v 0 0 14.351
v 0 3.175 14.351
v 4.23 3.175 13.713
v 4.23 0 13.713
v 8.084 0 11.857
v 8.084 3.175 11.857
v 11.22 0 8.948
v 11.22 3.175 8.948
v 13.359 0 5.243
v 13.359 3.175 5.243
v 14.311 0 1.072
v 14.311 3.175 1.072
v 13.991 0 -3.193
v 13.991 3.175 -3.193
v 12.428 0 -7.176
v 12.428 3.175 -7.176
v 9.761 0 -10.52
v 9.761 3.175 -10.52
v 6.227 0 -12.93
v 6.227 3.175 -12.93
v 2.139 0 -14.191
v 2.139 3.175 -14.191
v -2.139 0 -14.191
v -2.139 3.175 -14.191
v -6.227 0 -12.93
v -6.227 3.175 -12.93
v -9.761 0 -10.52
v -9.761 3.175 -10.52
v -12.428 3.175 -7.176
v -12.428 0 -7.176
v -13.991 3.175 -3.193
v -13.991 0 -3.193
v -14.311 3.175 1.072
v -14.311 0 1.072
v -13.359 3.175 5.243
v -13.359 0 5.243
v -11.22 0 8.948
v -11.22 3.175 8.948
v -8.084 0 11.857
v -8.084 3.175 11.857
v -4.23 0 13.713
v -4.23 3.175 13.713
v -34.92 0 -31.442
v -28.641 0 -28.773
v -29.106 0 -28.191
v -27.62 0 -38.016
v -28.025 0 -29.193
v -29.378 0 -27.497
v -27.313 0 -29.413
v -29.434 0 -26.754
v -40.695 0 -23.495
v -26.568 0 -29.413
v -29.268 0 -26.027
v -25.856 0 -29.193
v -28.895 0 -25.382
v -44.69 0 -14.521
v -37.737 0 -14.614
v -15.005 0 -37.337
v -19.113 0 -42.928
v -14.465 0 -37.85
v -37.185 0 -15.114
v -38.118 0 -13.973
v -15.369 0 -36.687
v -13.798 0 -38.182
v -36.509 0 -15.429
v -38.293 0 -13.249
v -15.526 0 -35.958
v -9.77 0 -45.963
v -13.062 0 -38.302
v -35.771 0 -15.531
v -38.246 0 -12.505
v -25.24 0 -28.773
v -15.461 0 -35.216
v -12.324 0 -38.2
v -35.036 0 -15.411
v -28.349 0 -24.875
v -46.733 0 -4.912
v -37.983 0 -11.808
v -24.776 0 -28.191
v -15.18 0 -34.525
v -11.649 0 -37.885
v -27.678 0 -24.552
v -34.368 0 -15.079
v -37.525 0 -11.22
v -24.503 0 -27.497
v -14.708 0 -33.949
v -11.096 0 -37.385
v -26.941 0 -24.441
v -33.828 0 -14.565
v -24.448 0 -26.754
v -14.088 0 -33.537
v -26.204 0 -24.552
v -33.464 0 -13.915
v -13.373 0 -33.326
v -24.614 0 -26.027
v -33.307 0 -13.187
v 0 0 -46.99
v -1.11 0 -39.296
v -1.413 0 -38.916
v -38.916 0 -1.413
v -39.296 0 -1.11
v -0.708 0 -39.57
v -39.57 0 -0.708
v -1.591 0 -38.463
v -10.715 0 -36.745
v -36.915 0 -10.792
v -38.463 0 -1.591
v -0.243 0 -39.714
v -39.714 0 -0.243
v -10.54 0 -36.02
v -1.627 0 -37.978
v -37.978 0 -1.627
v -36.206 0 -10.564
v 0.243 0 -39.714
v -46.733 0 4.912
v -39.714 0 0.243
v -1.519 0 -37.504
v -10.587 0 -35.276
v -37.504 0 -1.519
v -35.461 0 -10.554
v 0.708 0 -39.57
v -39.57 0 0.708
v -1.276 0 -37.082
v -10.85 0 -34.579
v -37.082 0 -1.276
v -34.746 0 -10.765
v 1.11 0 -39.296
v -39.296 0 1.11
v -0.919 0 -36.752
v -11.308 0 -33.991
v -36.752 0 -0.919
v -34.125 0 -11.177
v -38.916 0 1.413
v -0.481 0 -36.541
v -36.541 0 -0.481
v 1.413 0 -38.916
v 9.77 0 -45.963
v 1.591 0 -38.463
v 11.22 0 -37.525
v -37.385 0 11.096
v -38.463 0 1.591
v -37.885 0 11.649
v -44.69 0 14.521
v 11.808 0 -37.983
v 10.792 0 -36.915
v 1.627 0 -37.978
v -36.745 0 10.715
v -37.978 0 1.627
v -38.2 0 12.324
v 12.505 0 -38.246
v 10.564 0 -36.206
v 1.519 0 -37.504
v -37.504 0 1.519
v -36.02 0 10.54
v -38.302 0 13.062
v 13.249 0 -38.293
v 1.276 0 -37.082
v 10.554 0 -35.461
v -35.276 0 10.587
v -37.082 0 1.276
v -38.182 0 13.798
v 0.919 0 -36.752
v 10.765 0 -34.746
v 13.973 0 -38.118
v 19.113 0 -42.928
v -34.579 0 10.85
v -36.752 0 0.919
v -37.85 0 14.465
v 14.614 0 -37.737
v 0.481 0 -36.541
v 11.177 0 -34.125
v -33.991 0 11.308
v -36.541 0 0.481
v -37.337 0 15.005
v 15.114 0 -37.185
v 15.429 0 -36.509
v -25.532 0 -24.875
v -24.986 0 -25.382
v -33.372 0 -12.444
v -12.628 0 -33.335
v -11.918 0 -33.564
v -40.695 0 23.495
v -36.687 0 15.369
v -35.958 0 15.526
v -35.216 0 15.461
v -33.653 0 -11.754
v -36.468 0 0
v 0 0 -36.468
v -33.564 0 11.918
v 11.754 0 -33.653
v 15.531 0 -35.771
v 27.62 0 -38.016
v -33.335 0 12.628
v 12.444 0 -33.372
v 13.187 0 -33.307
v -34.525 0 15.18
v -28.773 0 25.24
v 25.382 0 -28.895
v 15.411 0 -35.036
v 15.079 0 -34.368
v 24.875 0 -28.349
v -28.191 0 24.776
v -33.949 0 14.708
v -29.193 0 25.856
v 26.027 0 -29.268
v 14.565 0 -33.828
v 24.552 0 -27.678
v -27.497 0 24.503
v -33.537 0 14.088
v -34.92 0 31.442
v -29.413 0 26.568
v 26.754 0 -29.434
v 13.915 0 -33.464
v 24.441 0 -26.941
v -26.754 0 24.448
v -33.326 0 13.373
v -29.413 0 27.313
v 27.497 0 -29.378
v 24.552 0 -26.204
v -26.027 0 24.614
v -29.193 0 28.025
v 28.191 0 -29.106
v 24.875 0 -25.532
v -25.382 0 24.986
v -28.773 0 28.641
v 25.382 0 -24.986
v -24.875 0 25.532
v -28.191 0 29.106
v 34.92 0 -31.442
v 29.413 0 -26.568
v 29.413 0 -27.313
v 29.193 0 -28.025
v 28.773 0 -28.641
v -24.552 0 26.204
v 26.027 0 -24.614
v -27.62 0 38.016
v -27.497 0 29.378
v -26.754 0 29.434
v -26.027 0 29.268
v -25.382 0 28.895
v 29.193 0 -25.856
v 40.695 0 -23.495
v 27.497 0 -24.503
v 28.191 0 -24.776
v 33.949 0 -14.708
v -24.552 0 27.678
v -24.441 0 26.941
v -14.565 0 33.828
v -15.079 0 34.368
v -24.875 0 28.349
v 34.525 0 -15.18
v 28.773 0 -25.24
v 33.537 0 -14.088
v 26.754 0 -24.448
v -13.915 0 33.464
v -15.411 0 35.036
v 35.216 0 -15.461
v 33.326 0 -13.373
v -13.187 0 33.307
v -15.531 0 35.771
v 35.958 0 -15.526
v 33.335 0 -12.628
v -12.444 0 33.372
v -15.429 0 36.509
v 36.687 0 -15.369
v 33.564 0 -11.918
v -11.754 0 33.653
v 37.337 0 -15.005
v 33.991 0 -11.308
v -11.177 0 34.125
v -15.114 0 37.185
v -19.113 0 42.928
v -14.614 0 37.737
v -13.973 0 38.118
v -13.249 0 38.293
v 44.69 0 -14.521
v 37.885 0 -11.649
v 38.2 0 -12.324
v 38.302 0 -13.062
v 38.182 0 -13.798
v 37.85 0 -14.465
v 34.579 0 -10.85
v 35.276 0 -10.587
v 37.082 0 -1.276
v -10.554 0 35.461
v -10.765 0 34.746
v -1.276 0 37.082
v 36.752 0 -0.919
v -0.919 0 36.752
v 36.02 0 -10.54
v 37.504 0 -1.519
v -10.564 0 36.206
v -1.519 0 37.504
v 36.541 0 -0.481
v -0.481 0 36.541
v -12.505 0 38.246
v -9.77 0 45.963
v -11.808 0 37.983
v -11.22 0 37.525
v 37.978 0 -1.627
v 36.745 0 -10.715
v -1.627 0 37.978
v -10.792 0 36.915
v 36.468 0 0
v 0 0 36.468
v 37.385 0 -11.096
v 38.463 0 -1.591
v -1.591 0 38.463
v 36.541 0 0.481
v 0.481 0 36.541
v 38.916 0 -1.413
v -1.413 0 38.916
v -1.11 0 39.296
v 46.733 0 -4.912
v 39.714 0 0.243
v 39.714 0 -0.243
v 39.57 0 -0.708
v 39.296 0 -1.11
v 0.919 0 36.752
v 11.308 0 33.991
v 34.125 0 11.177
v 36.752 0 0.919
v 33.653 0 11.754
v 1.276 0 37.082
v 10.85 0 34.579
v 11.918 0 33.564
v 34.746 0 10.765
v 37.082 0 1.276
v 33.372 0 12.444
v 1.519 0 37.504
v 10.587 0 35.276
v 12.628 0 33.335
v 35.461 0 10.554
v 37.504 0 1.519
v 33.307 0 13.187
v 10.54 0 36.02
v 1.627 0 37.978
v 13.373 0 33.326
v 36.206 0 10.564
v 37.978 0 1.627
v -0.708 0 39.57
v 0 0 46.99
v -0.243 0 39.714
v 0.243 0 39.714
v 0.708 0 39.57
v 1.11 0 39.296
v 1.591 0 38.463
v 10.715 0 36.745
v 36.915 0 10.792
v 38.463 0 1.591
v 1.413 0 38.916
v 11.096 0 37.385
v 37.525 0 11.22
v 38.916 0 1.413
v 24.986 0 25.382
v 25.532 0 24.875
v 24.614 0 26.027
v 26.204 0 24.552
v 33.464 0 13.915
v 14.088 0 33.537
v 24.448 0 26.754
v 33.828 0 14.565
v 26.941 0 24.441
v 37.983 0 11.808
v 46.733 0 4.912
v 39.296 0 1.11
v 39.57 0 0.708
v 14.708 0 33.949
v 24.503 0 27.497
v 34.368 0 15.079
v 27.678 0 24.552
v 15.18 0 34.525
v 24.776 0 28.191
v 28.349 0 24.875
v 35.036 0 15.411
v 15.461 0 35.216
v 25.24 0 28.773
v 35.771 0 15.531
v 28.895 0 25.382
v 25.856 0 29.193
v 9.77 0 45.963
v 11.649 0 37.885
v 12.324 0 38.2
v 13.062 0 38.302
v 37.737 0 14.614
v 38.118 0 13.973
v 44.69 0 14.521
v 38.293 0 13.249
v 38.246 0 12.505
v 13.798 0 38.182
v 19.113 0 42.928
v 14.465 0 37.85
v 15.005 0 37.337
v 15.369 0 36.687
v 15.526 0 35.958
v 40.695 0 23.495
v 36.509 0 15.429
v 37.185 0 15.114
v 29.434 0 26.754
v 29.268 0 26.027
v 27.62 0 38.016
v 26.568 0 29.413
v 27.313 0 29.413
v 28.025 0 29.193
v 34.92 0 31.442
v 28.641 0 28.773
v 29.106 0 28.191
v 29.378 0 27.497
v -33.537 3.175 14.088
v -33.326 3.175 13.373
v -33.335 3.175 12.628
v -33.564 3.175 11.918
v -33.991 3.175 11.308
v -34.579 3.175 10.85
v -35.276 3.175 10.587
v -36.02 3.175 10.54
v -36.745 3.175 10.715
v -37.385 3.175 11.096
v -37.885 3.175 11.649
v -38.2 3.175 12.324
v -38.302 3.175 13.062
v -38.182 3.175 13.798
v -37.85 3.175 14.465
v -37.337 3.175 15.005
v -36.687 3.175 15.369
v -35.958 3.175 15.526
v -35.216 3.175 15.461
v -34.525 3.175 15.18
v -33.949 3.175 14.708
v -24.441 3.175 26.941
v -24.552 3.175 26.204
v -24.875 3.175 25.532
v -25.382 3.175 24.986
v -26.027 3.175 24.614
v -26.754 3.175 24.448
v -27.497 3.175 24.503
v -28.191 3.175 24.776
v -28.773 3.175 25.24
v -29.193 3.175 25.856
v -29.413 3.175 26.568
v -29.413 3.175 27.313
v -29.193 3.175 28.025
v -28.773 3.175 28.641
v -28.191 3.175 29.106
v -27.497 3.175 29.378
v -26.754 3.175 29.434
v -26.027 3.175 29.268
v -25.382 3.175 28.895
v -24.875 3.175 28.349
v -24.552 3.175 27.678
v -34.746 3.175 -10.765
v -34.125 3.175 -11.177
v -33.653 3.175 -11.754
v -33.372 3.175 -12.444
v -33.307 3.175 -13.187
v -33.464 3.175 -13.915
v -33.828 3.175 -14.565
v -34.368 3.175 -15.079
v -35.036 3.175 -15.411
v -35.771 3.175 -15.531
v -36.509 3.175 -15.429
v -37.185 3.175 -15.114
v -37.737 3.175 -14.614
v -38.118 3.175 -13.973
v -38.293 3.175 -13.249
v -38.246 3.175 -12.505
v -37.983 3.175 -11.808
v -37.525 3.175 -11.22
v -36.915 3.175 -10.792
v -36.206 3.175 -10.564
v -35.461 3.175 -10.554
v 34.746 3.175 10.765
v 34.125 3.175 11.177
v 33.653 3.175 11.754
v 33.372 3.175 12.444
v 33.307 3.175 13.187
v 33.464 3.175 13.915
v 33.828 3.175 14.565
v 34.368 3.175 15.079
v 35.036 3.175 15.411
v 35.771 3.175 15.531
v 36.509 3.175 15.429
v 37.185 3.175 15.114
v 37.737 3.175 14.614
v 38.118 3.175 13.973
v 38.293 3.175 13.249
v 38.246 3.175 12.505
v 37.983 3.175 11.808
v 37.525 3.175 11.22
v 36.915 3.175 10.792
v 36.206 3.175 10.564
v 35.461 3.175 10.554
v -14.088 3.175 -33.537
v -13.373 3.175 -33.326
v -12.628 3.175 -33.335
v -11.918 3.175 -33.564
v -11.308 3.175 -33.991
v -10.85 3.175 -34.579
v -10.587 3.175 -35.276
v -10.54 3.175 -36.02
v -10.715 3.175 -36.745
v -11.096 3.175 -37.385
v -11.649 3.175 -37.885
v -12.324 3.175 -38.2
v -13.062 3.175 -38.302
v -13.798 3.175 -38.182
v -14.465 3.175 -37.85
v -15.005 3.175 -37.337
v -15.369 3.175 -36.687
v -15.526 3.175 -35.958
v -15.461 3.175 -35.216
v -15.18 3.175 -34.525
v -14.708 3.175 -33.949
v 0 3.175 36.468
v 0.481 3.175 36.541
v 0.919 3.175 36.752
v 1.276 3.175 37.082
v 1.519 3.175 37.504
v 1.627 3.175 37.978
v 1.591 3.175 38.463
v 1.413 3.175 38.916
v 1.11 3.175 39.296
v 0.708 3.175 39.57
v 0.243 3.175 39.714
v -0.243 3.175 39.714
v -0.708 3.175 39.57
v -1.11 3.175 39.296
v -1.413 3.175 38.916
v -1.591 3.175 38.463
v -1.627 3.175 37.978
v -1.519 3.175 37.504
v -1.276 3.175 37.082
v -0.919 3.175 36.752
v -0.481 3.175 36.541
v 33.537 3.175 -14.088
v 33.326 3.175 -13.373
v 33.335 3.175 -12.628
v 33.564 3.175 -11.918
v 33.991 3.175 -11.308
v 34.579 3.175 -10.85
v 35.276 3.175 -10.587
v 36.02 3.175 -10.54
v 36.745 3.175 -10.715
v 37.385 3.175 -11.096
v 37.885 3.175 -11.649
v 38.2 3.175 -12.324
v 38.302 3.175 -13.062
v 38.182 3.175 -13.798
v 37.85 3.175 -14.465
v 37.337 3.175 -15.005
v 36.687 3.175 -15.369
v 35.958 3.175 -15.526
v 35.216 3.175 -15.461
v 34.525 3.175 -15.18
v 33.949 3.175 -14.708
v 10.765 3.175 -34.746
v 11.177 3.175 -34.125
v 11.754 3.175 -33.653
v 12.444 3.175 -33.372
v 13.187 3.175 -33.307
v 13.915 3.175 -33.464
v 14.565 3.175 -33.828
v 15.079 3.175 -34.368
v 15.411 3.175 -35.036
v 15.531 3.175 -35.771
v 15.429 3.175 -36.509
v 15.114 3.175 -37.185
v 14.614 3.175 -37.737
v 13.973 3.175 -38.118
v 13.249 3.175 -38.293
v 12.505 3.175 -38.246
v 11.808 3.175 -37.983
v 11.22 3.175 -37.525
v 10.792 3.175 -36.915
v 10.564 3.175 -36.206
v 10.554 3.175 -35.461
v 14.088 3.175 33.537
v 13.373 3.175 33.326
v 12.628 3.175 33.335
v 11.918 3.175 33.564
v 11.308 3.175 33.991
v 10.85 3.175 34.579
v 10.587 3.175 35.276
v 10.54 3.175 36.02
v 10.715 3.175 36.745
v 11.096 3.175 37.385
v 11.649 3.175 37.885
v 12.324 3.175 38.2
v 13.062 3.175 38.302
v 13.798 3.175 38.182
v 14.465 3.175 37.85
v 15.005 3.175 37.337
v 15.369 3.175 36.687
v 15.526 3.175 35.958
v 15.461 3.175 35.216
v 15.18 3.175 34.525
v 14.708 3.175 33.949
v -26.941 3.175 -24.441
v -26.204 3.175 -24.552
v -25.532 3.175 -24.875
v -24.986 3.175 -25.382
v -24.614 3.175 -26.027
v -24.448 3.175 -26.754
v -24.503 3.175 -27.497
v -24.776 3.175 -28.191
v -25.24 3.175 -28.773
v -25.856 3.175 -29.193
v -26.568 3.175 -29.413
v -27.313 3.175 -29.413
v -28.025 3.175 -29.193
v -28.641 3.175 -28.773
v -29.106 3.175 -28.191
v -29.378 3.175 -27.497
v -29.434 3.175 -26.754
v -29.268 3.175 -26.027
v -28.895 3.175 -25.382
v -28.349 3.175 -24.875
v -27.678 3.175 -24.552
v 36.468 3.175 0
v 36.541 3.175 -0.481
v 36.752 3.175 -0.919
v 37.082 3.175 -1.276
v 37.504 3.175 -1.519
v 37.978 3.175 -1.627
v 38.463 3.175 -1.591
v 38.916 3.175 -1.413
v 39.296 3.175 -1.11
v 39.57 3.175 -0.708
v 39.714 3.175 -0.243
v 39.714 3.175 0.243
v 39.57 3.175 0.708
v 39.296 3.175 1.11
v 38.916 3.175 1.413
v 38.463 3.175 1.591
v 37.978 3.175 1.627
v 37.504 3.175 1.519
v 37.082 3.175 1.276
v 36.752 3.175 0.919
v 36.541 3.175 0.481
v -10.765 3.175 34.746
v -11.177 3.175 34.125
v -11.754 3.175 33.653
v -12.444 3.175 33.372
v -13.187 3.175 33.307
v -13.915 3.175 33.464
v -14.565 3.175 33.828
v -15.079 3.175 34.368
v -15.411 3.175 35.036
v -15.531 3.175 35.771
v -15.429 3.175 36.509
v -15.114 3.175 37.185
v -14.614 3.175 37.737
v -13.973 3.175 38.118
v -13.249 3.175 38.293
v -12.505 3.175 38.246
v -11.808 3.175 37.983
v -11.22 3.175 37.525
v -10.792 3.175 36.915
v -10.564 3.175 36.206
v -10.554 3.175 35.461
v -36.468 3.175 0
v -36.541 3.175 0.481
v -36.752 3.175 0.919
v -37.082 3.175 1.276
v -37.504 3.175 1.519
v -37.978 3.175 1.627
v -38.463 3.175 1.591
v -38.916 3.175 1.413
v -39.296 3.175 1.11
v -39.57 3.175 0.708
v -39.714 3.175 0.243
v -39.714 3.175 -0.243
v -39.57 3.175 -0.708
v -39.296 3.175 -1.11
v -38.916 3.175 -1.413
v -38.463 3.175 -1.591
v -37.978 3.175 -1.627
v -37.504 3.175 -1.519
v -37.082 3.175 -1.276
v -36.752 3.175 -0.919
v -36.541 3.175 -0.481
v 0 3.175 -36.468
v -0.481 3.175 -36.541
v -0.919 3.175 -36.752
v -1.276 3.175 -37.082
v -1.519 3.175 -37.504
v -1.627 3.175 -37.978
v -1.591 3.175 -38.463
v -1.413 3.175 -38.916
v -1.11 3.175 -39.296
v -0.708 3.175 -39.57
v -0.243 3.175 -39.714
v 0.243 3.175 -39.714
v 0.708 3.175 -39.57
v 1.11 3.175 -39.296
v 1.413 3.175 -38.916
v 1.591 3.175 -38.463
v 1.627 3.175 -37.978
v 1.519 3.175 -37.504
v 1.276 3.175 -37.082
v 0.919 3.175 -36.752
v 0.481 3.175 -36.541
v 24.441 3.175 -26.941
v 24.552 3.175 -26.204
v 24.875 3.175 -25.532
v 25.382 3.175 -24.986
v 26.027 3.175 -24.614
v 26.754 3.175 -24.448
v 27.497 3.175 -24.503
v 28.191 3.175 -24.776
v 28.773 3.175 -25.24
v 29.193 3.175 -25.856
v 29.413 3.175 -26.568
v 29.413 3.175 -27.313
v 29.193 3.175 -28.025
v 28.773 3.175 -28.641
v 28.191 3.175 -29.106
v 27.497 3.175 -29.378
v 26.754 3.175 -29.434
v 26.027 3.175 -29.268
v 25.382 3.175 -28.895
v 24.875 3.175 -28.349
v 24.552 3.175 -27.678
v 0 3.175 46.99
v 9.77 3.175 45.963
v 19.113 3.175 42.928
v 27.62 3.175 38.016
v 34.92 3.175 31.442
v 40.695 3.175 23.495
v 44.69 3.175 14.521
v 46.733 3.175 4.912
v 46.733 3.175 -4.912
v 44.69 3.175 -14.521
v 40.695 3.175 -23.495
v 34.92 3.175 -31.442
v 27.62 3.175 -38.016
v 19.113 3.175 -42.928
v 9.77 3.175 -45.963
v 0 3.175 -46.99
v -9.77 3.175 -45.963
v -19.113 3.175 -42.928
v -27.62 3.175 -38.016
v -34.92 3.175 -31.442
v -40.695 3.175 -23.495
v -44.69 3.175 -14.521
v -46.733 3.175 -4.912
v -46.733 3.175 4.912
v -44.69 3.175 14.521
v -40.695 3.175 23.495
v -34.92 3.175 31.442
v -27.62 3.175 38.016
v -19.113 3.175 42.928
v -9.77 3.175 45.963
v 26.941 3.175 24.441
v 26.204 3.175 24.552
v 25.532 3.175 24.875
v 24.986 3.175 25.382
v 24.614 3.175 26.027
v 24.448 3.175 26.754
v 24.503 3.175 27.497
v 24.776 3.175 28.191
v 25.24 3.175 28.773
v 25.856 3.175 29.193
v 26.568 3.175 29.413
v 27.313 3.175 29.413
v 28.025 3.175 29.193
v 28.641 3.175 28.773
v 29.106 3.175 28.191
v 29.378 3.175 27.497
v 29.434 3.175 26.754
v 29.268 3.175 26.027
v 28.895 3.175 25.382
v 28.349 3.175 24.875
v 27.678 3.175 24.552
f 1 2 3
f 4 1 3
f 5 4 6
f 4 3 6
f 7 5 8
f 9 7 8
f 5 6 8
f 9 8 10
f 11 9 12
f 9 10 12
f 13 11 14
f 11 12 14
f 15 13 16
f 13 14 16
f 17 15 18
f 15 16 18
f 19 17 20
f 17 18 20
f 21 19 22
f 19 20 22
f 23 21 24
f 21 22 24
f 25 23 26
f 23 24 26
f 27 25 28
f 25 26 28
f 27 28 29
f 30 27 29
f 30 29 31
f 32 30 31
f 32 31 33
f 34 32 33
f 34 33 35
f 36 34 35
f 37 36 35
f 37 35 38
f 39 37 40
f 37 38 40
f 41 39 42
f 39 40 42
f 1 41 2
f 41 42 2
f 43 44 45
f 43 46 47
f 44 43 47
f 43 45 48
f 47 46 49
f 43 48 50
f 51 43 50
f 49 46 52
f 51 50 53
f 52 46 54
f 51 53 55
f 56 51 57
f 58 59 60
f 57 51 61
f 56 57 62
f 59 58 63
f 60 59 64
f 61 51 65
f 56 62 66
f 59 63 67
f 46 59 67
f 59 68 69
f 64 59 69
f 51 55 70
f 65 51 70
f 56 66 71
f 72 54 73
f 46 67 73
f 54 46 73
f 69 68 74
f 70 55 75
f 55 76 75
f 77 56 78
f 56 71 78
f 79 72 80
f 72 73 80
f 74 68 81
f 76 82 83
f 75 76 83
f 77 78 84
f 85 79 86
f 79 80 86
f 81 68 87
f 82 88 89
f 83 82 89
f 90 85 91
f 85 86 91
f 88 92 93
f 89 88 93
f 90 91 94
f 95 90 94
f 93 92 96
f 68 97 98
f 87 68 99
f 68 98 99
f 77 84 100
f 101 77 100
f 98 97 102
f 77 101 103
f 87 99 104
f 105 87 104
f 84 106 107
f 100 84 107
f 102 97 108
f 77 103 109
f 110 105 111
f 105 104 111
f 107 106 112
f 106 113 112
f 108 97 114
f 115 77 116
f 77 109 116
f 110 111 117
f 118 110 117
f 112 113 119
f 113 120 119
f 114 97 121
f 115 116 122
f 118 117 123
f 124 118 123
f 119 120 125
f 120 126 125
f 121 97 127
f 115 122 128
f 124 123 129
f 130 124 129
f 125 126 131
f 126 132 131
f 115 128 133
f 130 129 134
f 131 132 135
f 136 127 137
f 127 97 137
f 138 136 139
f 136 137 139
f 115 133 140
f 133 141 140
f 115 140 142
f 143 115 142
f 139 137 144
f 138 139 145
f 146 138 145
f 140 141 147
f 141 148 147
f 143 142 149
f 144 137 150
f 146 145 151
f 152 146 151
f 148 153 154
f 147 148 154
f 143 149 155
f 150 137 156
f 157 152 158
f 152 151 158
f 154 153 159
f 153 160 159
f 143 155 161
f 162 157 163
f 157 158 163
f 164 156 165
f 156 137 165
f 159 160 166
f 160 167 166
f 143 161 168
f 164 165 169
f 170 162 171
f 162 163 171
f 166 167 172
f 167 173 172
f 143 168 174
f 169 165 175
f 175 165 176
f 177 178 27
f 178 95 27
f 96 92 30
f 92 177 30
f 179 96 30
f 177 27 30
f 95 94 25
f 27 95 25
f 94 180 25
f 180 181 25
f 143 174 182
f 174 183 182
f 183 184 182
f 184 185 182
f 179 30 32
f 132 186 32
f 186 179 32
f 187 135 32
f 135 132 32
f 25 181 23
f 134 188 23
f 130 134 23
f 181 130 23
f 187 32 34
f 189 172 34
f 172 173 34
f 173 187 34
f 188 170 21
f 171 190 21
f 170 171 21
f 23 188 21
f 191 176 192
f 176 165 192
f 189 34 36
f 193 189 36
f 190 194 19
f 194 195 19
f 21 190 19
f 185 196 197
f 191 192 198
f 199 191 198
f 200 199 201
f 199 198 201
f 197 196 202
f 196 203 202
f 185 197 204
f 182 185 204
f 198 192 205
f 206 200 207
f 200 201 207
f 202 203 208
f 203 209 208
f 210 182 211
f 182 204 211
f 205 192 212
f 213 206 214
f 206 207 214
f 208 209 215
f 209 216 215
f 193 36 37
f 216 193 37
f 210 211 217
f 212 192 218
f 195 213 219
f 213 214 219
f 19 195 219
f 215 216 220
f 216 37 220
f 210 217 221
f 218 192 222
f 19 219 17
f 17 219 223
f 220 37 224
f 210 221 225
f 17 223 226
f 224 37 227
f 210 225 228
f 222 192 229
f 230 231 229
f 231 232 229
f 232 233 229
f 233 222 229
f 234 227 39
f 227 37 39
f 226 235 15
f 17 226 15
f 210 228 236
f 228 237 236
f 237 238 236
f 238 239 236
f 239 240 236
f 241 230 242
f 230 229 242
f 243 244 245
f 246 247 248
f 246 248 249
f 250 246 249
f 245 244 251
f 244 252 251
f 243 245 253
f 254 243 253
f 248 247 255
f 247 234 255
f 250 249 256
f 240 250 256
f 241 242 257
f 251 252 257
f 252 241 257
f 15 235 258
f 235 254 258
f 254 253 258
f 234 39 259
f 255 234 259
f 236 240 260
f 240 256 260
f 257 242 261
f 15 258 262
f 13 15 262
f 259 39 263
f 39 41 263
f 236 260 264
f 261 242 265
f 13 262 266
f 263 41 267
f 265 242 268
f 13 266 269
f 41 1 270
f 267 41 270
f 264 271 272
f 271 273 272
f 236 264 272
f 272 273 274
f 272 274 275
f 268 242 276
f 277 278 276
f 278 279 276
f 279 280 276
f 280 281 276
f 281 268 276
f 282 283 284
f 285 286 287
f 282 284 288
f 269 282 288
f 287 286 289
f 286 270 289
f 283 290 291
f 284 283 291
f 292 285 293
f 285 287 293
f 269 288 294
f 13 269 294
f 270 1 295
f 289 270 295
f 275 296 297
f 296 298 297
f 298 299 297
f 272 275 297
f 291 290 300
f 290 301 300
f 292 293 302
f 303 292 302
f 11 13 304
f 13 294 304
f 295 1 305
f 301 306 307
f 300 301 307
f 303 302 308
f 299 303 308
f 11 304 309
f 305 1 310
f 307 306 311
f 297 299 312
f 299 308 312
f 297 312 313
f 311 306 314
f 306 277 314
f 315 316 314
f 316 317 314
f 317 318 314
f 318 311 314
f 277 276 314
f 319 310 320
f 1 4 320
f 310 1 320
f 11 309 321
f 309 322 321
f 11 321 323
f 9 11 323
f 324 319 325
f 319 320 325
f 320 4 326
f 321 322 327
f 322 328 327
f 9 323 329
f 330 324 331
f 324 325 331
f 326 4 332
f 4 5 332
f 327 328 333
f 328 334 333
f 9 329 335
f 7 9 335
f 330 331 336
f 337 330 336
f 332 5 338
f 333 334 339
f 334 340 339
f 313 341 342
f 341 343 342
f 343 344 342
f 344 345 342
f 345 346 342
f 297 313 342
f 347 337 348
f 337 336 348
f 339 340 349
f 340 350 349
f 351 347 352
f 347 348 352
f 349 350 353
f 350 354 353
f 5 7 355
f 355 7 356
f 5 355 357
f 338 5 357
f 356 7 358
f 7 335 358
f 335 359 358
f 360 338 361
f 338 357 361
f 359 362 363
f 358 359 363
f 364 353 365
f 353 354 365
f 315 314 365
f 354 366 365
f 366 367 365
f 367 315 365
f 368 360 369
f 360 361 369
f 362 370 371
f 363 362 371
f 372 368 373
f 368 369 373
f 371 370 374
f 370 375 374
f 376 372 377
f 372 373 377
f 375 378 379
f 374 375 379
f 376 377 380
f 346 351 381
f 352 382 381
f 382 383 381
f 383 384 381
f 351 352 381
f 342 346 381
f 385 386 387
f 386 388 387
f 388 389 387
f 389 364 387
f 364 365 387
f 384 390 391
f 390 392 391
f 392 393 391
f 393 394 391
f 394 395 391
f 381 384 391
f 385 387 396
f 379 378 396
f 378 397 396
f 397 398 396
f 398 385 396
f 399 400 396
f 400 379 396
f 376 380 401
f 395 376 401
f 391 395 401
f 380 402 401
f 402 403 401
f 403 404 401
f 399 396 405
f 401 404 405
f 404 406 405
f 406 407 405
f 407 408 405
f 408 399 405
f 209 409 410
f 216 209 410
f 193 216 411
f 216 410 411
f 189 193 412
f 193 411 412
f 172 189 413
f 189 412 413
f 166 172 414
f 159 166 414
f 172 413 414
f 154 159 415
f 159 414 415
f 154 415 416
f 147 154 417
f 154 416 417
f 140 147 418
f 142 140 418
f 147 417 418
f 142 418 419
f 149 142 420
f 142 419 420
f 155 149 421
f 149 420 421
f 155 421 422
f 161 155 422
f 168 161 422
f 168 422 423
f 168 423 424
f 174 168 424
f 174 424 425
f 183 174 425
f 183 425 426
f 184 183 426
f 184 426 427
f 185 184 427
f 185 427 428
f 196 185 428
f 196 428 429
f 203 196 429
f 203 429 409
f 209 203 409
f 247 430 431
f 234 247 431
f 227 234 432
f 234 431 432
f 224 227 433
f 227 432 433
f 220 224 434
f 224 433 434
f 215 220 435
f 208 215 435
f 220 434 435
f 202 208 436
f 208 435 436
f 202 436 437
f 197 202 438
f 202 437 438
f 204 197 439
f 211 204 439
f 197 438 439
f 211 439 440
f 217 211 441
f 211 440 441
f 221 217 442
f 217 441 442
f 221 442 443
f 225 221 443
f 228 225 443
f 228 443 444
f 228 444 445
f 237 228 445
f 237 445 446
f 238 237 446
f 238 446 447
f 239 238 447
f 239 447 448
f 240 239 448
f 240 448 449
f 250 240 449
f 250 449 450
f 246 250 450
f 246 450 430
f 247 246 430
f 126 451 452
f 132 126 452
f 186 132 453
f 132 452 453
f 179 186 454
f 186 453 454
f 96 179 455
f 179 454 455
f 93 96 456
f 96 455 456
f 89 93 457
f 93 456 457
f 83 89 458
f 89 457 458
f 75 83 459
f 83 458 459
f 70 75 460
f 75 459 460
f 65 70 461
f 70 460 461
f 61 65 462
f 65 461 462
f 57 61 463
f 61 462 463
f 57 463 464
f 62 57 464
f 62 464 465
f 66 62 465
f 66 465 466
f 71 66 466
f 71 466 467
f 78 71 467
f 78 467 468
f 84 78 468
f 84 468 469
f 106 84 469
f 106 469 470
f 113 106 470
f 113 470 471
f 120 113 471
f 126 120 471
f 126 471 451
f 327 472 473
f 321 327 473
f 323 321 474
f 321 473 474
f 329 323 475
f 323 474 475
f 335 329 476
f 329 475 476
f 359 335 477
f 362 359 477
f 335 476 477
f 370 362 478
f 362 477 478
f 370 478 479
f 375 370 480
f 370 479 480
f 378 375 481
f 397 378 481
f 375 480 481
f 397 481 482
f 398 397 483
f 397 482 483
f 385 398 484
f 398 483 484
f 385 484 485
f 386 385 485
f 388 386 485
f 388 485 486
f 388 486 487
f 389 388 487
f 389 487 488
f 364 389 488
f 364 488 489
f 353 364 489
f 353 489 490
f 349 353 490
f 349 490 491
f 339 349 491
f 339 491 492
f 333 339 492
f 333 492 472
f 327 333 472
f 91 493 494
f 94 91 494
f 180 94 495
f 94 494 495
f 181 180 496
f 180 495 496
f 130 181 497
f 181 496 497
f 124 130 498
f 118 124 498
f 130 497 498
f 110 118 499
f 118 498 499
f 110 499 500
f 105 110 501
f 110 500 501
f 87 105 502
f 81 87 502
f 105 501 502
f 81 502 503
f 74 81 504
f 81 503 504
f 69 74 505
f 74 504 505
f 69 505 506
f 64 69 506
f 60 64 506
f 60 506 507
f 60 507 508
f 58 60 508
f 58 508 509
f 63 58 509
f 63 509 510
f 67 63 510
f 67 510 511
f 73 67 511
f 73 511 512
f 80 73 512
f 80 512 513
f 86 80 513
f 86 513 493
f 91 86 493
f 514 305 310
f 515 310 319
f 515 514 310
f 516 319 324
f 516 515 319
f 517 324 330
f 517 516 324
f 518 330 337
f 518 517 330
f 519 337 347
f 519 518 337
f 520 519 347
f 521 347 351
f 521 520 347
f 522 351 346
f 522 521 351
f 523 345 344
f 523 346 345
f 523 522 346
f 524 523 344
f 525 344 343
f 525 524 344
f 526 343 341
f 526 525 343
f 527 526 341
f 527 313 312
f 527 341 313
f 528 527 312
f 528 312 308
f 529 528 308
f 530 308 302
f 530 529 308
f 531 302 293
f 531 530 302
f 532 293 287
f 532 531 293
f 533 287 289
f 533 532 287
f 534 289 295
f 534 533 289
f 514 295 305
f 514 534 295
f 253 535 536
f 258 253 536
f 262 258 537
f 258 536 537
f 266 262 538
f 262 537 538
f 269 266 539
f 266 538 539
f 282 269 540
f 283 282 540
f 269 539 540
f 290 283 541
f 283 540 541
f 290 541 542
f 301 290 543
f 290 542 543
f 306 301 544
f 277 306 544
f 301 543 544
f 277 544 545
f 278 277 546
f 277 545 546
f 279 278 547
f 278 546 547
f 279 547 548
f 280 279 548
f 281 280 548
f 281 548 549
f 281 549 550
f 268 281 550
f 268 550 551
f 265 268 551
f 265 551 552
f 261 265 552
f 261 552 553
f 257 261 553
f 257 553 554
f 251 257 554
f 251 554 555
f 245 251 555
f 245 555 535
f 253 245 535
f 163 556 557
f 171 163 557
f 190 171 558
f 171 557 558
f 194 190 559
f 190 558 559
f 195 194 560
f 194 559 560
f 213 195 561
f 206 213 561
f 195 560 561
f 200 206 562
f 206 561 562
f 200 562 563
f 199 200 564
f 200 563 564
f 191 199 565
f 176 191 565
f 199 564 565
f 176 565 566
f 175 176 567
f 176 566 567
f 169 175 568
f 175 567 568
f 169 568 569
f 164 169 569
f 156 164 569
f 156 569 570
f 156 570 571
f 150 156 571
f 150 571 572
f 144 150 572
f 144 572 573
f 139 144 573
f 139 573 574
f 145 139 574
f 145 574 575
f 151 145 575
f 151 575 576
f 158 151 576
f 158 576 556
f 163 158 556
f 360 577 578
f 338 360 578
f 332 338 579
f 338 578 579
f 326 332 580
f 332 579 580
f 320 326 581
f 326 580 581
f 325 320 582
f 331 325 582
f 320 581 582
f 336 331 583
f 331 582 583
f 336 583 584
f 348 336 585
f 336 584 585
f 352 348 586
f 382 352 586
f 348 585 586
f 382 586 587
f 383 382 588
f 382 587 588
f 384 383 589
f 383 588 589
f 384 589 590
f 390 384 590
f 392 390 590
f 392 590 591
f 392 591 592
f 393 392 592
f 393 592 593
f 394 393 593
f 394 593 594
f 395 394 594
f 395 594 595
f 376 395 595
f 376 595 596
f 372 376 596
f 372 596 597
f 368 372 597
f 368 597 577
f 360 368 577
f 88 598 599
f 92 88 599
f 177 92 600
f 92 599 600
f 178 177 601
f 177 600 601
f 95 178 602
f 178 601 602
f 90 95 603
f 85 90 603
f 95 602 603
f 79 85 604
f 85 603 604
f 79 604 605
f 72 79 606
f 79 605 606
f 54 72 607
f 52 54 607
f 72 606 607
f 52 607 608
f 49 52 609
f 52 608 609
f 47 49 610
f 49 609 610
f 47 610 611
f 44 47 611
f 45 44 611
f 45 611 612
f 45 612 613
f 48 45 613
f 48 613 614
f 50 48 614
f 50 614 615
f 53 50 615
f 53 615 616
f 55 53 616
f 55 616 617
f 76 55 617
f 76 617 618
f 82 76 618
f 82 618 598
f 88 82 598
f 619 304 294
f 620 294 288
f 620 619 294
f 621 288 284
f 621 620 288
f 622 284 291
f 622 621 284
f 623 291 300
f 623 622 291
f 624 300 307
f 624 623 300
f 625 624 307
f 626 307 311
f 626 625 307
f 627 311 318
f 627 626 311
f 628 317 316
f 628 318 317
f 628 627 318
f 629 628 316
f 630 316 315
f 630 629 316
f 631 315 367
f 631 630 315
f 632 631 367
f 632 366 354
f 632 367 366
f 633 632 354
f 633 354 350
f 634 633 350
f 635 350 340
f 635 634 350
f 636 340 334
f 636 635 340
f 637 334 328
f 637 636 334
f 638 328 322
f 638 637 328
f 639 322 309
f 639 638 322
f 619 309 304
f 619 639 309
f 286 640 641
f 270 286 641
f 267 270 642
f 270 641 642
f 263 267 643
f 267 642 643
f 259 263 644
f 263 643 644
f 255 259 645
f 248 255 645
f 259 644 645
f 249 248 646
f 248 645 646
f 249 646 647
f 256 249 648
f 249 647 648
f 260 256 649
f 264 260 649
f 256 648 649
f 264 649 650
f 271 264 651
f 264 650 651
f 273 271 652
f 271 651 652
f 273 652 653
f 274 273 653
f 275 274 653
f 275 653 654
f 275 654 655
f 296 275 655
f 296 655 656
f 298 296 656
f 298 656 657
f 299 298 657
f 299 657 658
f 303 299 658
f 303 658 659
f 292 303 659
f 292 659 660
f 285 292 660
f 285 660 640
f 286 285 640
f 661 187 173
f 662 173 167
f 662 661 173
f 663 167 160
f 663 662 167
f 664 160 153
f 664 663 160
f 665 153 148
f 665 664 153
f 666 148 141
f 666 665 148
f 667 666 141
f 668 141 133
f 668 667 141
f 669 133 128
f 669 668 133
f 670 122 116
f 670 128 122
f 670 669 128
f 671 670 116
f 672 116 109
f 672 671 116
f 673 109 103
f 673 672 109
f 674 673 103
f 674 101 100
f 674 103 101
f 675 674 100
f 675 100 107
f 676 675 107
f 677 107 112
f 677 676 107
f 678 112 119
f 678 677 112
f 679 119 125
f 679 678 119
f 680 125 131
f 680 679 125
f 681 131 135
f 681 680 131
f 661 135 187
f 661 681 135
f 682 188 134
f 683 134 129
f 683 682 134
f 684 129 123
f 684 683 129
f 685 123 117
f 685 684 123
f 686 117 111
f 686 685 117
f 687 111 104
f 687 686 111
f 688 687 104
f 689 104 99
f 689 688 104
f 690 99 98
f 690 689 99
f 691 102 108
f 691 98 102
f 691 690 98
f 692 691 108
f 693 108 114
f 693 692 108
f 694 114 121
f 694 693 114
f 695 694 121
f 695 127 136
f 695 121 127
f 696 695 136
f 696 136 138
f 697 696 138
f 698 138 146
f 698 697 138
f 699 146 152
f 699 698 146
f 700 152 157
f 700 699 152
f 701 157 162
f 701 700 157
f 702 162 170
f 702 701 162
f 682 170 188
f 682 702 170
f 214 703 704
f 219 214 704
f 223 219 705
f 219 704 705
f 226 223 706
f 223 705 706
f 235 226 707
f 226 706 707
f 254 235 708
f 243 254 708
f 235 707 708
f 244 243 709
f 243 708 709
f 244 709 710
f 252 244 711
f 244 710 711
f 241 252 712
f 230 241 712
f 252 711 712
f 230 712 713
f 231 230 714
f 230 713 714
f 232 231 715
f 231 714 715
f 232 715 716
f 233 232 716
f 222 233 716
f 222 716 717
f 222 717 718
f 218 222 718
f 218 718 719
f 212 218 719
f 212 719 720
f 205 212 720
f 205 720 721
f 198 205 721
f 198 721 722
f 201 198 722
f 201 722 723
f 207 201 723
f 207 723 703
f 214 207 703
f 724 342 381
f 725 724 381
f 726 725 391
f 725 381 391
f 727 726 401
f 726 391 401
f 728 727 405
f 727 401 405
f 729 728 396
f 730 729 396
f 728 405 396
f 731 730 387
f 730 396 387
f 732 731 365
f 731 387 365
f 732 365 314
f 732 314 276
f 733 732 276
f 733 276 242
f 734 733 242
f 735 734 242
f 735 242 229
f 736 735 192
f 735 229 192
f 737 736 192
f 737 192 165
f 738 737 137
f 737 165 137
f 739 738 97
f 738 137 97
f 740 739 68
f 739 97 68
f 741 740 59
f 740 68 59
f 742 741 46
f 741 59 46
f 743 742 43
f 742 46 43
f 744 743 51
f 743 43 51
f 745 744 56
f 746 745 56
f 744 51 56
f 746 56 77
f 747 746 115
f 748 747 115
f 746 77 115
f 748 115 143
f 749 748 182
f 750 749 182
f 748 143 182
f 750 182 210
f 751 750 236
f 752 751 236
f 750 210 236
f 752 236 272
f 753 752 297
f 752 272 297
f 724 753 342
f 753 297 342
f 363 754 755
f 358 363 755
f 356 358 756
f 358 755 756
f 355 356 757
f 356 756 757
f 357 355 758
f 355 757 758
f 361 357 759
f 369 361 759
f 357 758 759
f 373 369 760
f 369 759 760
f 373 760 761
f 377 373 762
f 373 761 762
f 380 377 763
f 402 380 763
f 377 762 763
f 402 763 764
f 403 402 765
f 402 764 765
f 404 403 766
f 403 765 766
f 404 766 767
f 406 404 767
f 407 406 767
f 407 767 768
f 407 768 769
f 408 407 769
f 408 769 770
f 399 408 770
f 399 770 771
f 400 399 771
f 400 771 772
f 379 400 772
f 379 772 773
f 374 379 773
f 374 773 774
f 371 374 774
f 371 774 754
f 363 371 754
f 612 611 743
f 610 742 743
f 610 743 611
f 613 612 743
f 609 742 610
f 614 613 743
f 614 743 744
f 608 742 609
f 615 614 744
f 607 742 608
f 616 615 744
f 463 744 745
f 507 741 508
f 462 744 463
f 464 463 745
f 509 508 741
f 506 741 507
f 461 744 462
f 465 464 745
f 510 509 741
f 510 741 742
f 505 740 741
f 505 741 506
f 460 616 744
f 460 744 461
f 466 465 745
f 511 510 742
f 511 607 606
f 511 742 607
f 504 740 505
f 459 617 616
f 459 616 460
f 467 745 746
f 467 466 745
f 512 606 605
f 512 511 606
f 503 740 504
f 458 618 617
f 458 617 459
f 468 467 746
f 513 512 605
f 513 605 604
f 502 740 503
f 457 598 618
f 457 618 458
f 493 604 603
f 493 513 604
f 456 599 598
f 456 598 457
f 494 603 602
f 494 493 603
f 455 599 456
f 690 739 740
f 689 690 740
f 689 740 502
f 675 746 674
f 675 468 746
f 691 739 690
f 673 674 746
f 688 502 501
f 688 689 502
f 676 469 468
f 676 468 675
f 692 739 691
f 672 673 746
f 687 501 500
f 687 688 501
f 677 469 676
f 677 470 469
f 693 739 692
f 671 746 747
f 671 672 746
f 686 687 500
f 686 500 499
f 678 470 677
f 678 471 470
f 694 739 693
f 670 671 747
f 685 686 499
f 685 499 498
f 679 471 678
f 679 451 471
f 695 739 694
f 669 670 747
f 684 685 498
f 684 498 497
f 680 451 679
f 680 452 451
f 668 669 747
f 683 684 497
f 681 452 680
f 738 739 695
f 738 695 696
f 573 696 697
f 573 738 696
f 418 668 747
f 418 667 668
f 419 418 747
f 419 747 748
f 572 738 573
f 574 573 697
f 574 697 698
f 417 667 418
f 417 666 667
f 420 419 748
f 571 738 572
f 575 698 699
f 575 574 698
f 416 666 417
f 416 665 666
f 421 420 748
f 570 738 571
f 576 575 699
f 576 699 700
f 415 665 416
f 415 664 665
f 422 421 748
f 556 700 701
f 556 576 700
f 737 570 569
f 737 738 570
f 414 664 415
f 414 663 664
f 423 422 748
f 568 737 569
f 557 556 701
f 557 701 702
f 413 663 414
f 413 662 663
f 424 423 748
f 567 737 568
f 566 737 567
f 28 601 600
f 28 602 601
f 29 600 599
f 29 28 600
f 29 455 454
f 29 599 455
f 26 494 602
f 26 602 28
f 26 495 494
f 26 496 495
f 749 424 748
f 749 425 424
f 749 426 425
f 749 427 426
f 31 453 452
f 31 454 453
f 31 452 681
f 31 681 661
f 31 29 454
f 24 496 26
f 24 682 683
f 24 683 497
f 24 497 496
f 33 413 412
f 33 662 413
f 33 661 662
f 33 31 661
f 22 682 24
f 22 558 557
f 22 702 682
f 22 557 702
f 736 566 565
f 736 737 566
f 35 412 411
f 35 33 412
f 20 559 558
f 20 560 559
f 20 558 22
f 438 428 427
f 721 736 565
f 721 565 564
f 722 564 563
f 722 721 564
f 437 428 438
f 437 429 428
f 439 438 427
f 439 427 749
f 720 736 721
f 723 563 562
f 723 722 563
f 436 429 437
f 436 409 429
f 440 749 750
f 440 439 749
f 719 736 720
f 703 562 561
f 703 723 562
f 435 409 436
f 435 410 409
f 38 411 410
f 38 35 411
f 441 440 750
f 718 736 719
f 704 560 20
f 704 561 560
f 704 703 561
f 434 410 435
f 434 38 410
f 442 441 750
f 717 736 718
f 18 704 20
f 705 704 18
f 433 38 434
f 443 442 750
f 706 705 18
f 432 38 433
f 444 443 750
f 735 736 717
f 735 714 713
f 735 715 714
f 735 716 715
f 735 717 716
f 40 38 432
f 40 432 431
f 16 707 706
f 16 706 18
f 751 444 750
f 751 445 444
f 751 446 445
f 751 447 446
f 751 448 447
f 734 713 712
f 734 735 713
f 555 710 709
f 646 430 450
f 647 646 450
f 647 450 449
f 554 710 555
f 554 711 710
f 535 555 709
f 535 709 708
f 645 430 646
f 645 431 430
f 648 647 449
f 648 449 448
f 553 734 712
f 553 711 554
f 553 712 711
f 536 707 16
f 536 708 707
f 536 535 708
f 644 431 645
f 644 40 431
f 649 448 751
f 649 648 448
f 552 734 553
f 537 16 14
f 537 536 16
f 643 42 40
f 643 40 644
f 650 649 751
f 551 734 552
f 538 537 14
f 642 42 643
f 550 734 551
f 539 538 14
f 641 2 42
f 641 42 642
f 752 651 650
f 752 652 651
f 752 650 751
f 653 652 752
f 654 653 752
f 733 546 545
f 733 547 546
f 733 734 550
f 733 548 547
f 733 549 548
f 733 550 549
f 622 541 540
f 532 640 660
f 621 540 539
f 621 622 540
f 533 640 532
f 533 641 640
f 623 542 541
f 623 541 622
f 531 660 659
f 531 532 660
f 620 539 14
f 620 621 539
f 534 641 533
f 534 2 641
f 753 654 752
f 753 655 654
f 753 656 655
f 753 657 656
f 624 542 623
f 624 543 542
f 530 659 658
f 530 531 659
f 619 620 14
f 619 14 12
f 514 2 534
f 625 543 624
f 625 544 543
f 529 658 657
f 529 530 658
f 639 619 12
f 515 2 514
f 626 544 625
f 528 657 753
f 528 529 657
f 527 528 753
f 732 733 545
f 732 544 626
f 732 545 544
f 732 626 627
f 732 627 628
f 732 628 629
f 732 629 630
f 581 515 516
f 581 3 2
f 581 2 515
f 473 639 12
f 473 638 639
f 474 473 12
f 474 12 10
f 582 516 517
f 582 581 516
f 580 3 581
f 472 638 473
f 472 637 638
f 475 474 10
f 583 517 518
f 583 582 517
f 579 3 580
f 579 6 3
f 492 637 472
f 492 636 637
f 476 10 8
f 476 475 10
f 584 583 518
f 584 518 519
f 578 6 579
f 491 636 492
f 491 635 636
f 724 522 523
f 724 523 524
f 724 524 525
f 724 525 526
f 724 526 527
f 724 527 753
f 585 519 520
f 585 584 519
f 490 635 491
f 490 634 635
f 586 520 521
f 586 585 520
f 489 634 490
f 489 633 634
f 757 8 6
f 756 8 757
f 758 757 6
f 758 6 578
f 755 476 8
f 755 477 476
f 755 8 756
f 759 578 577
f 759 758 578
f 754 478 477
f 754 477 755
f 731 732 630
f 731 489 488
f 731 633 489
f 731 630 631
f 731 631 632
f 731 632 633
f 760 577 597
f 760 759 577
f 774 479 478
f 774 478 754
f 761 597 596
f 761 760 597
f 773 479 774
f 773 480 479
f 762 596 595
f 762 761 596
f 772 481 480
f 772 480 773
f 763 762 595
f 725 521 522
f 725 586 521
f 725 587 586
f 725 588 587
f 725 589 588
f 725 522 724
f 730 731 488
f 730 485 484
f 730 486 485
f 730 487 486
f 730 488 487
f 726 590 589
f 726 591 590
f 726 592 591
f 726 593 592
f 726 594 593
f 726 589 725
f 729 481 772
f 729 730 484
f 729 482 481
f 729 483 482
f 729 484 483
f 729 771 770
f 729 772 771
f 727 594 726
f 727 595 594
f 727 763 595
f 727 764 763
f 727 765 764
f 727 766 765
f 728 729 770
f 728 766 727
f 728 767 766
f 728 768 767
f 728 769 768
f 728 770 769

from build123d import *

# Parameters (mm, degrees)
SKETCH1_R                   = 46.99
BOSS_EXTRUDE1_DEPTH         = 3.175
SKETCH2_R                   = 14.351
CUT_EXTRUDE1_DEPTH          = 3.175
CIRPATTERN1_COUNT           = 4
SKETCH5_R                   = 2.5
CUT_EXTRUDE2_DEPTH          = 5.08
CIRPATTERN2_COUNT           = 4
CIRPATTERN3_COUNT           = 2
CIRPATTERN3_ANGLE           = 25
CIRPATTERN3_COPY_1_SKETCH_R = 2.5
CIRPATTERN3_COPY_1_DEPTH    = 5.08
CIRPATTERN3_COPY_2_SKETCH_R = 2.5
CIRPATTERN3_COPY_2_DEPTH    = 5.08
CIRPATTERN3_COPY_3_SKETCH_R = 2.5
CIRPATTERN3_COPY_3_DEPTH    = 5.08
CIRPATTERN4_COUNT           = 2
CIRPATTERN4_ANGLE           = 25
CIRPATTERN4_COPY_1_SKETCH_R = 2.5
CIRPATTERN4_COPY_1_DEPTH    = 5.08
CIRPATTERN4_COPY_2_SKETCH_R = 2.5
CIRPATTERN4_COPY_2_DEPTH    = 5.08
CIRPATTERN4_COPY_3_SKETCH_R = 2.5
CIRPATTERN4_COPY_3_DEPTH    = 5.08


with BuildPart() as part:
    # Sketch1 → Boss-Extrude1 (new body)
    with BuildSketch(Plane(origin=(0, 0, 0), x_dir=(1, 0, 0), z_dir=(0, 1, 0))):
        with Locations(Location((0, 0, 0), (0, 0, 270))):
            Circle(SKETCH1_R)
    extrude(amount=BOSS_EXTRUDE1_DEPTH)

    # Sketch2 → Cut-Extrude1 (cut)
    with BuildSketch(Plane(origin=(0, 3.175, 0), x_dir=(1, 0, 0), z_dir=(0, 1, 0))):
        with Locations(Location((0, 0, 0), (0, 0, 270))):
            Circle(SKETCH2_R)
    extrude(amount=-CUT_EXTRUDE1_DEPTH, mode=Mode.SUBTRACT)

    # Sketch3 → #4 Clearance Hole1 (revolve, cut)
    with BuildSketch(Plane(origin=(0, 3.175, -38.1), x_dir=(0, 0, 1), z_dir=(1, 0, 0))):
        Polygon((0, 0), (0, 11.140574487), (1.63195, 10.16), (1.63195, 0), align=None)
    f_4_clearance_hole1 = revolve(axis=Axis((0, 9.525, -38.1), (0, -1, 0)), mode=Mode.SUBTRACT)

    # CirPattern1: #4 Clearance Hole1 ×4 about axis
    cirpattern1_axis = Axis((0, 0, 0), (0, 1, 0))
    for i in range(1, CIRPATTERN1_COUNT):
        add(f_4_clearance_hole1.rotate(cirpattern1_axis, i * 360 / CIRPATTERN1_COUNT), mode=Mode.SUBTRACT)

    # Sketch5 → Cut-Extrude2 (cut)
    with BuildSketch(Plane(origin=(0, 3.175, 0), x_dir=(1, 0, 0), z_dir=(0, 1, 0))):
        with Locations(Location((-26.940768363, 26.940768363, 0), (0, 0, 270))):
            Circle(SKETCH5_R)
    cut_extrude2 = extrude(amount=-CUT_EXTRUDE2_DEPTH, mode=Mode.SUBTRACT)

    # CirPattern2: Cut-Extrude2 ×4 about axis
    cirpattern2_axis = Axis((0, 0, 0), (0, 1, 0))
    for i in range(1, CIRPATTERN2_COUNT):
        add(cut_extrude2.rotate(cirpattern2_axis, i * 360 / CIRPATTERN2_COUNT), mode=Mode.SUBTRACT)

    # CirPattern3: Cut-Extrude2 ×2 about axis
    cirpattern3_axis = Axis((0, 0, 0), (0, 1, 0))
    for i in range(1, CIRPATTERN3_COUNT):
        add(cut_extrude2.rotate(cirpattern3_axis, i * CIRPATTERN3_ANGLE / (CIRPATTERN3_COUNT - 1)), mode=Mode.SUBTRACT)

    # CirPattern3 copy 1 sketch → CirPattern3 copy 1 (cut)
    with BuildSketch(Plane(origin=(0, 3.175, 0), x_dir=(-0.4226182617407003, 0, -0.9063077870366495), z_dir=(0, 1, 0))):
        with Locations(Location((-26.940768363, 26.940768363, 0), (0, 0, 270))):
            Circle(CIRPATTERN3_COPY_1_SKETCH_R)
    extrude(amount=-CIRPATTERN3_COPY_1_DEPTH, mode=Mode.SUBTRACT)

    # CirPattern3 copy 2 sketch → CirPattern3 copy 2 (cut)
    with BuildSketch(Plane(origin=(0, 3.175, 0), x_dir=(-0.9063077870366495, 0, 0.4226182617407002), z_dir=(0, 1, 0))):
        with Locations(Location((-26.940768363, 26.940768363, 0), (0, 0, 270))):
            Circle(CIRPATTERN3_COPY_2_SKETCH_R)
    extrude(amount=-CIRPATTERN3_COPY_2_DEPTH, mode=Mode.SUBTRACT)

    # CirPattern3 copy 3 sketch → CirPattern3 copy 3 (cut)
    with BuildSketch(Plane(origin=(0, 3.175, 0), x_dir=(0.42261826174070016, 0, 0.9063077870366496), z_dir=(0, 1, 0))):
        with Locations(Location((-26.940768363, 26.940768363, 0), (0, 0, 270))):
            Circle(CIRPATTERN3_COPY_3_SKETCH_R)
    extrude(amount=-CIRPATTERN3_COPY_3_DEPTH, mode=Mode.SUBTRACT)

    # CirPattern4: Cut-Extrude2 ×2 about axis
    cirpattern4_axis = Axis((0, 0, 0), (0, -1, 0))
    for i in range(1, CIRPATTERN4_COUNT):
        add(cut_extrude2.rotate(cirpattern4_axis, i * CIRPATTERN4_ANGLE / (CIRPATTERN4_COUNT - 1)), mode=Mode.SUBTRACT)

    # CirPattern4 copy 1 sketch → CirPattern4 copy 1 (cut)
    with BuildSketch(Plane(origin=(0, 3.175, 0), x_dir=(0.4226182617407004, 0, -0.9063077870366495), z_dir=(0, 1, 0))):
        with Locations(Location((-26.940768363, 26.940768363, 0), (0, 0, 270))):
            Circle(CIRPATTERN4_COPY_1_SKETCH_R)
    extrude(amount=-CIRPATTERN4_COPY_1_DEPTH, mode=Mode.SUBTRACT)

    # CirPattern4 copy 2 sketch → CirPattern4 copy 2 (cut)
    with BuildSketch(Plane(origin=(0, 3.175, 0), x_dir=(-0.9063077870366495, 0, -0.42261826174070044), z_dir=(0, 1, 0))):
        with Locations(Location((-26.940768363, 26.940768363, 0), (0, 0, 270))):
            Circle(CIRPATTERN4_COPY_2_SKETCH_R)
    extrude(amount=-CIRPATTERN4_COPY_2_DEPTH, mode=Mode.SUBTRACT)

    # CirPattern4 copy 3 sketch → CirPattern4 copy 3 (cut)
    with BuildSketch(Plane(origin=(0, 3.175, 0), x_dir=(-0.4226182617407005, 0, 0.9063077870366494), z_dir=(0, 1, 0))):
        with Locations(Location((-26.940768363, 26.940768363, 0), (0, 0, 270))):
            Circle(CIRPATTERN4_COPY_3_SKETCH_R)
    extrude(amount=-CIRPATTERN4_COPY_3_DEPTH, mode=Mode.SUBTRACT)


solid = part.part
